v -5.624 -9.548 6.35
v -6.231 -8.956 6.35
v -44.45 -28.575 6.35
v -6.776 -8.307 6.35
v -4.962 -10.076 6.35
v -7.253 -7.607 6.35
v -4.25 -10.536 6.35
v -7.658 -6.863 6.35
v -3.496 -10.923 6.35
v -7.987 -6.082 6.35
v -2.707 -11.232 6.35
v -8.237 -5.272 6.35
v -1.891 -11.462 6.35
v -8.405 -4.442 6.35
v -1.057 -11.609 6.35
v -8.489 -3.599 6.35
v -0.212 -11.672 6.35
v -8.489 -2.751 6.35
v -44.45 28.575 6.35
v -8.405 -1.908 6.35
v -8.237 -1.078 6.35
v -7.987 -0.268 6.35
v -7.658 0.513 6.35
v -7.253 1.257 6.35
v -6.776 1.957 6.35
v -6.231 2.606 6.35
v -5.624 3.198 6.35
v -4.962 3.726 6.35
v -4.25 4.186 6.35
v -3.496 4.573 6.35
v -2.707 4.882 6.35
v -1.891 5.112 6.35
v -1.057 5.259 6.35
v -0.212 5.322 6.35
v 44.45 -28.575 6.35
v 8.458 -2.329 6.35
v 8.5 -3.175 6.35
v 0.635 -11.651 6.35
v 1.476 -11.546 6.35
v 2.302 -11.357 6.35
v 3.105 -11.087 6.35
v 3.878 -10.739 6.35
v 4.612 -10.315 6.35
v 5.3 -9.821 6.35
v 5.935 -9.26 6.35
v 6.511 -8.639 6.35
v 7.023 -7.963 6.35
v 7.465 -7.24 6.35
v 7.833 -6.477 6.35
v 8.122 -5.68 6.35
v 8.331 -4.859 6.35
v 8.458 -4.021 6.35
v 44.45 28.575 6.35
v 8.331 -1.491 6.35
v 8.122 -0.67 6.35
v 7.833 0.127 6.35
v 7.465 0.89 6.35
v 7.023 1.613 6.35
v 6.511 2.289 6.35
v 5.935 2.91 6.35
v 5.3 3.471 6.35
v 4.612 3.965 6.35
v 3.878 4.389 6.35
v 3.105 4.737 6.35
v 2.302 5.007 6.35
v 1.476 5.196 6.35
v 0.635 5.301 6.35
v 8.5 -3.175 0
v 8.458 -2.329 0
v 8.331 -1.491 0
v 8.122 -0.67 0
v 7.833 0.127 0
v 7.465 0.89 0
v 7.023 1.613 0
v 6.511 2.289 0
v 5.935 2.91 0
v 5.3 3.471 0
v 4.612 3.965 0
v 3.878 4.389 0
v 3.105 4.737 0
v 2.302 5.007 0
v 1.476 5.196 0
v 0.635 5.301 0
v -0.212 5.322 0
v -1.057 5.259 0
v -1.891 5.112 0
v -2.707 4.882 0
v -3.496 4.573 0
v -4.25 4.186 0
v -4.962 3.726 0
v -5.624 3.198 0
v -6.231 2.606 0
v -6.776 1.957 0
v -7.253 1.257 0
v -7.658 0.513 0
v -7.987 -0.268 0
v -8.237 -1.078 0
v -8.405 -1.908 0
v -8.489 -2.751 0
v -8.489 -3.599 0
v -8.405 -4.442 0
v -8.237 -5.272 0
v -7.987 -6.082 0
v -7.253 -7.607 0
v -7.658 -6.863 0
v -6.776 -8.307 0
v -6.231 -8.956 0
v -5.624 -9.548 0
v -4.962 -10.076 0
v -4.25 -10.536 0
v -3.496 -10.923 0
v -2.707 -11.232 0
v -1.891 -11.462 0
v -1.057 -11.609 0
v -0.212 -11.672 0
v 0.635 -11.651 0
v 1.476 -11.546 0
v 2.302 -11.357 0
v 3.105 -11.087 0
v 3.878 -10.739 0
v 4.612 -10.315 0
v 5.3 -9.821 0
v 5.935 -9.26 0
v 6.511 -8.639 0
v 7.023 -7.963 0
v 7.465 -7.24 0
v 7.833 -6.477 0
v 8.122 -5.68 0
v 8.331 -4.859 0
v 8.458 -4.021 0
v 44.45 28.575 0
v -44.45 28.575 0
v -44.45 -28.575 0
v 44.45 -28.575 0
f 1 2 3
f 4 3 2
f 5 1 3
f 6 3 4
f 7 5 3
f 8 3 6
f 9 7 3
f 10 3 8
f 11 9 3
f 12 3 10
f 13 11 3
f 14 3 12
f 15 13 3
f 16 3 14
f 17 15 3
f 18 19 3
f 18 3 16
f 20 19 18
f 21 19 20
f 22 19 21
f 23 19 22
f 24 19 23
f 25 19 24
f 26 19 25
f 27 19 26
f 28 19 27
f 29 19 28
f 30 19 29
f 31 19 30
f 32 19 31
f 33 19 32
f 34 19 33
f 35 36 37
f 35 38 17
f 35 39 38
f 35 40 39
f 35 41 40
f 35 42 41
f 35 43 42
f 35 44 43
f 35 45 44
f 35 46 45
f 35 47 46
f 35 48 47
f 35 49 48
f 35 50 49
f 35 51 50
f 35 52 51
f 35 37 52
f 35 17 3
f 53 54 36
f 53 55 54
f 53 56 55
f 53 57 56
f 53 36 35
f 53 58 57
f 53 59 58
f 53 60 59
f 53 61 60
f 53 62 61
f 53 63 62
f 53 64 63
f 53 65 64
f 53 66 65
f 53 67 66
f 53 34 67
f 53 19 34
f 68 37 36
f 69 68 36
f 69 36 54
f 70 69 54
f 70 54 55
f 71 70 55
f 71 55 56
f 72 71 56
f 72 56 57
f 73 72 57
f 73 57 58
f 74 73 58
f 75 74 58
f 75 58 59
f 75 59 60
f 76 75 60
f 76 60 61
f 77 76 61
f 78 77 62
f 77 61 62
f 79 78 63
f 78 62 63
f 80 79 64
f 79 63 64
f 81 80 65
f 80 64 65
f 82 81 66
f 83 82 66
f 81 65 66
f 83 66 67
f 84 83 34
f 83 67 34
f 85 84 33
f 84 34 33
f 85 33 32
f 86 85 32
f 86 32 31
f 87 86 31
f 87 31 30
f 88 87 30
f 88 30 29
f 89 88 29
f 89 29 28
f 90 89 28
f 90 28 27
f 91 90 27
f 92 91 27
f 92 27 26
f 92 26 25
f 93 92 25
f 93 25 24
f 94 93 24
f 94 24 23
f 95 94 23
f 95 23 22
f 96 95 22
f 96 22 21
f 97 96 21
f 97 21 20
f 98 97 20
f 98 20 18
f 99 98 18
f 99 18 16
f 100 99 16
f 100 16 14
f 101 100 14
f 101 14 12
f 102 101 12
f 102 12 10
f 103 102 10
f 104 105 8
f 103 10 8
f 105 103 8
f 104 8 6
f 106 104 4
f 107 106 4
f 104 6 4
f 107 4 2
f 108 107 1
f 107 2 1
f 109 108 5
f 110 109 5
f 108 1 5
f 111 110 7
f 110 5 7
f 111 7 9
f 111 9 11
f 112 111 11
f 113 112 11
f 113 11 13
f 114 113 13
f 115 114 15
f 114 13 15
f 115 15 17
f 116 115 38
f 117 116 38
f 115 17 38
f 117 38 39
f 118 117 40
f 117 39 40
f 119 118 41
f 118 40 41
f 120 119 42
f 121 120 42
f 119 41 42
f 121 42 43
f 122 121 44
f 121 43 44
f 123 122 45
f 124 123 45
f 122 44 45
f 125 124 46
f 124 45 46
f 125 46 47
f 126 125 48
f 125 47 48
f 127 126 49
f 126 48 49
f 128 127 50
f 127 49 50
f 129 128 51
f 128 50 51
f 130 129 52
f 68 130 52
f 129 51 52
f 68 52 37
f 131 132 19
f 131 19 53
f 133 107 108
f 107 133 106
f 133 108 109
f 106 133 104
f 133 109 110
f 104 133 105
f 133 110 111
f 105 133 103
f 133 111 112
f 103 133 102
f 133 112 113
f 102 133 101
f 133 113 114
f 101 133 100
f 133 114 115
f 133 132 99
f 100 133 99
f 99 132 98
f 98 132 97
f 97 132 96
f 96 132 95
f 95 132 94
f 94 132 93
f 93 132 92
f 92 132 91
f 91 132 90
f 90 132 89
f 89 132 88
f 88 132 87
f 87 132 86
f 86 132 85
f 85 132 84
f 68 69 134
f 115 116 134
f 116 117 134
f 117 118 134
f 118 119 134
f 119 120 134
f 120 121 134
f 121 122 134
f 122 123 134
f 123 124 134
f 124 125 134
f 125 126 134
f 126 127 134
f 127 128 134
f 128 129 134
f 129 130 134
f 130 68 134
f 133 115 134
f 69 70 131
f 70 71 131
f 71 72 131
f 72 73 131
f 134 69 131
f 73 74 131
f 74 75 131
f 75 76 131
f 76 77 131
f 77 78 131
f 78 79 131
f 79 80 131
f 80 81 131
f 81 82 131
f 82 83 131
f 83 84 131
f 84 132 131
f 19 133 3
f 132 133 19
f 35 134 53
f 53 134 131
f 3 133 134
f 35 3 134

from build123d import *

# Parameters (mm, degrees)
SKETCH1_W           = 88.9
SKETCH1_H           = 57.15
BOSS_EXTRUDE1_DEPTH = 6.35
CUT_EXTRUDE1_REACH  = 55.223
SKETCH2_R           = 8.5


with BuildPart() as part:
    # Sketch1 → Boss-Extrude1 (new body)
    with BuildSketch(Plane.XY):
        Rectangle(SKETCH1_W, SKETCH1_H)
    extrude(amount=BOSS_EXTRUDE1_DEPTH)

    # Sketch2 → Cut-Extrude1 (cut, up to next)
    with BuildSketch(Plane.XY.offset(6.35), mode=Mode.PRIVATE) as cut_extrude1_sk1:
        with Locations((0, -3.175)):
            Circle(SKETCH2_R)
    cut_extrude1_tool1 = extrude(cut_extrude1_sk1.sketch, amount=-CUT_EXTRUDE1_REACH, mode=Mode.PRIVATE) & part.part
    add(cut_extrude1_tool1.solids().sort_by_distance((0, -3.175, 6.35))[0], mode=Mode.SUBTRACT)


solid = part.part
